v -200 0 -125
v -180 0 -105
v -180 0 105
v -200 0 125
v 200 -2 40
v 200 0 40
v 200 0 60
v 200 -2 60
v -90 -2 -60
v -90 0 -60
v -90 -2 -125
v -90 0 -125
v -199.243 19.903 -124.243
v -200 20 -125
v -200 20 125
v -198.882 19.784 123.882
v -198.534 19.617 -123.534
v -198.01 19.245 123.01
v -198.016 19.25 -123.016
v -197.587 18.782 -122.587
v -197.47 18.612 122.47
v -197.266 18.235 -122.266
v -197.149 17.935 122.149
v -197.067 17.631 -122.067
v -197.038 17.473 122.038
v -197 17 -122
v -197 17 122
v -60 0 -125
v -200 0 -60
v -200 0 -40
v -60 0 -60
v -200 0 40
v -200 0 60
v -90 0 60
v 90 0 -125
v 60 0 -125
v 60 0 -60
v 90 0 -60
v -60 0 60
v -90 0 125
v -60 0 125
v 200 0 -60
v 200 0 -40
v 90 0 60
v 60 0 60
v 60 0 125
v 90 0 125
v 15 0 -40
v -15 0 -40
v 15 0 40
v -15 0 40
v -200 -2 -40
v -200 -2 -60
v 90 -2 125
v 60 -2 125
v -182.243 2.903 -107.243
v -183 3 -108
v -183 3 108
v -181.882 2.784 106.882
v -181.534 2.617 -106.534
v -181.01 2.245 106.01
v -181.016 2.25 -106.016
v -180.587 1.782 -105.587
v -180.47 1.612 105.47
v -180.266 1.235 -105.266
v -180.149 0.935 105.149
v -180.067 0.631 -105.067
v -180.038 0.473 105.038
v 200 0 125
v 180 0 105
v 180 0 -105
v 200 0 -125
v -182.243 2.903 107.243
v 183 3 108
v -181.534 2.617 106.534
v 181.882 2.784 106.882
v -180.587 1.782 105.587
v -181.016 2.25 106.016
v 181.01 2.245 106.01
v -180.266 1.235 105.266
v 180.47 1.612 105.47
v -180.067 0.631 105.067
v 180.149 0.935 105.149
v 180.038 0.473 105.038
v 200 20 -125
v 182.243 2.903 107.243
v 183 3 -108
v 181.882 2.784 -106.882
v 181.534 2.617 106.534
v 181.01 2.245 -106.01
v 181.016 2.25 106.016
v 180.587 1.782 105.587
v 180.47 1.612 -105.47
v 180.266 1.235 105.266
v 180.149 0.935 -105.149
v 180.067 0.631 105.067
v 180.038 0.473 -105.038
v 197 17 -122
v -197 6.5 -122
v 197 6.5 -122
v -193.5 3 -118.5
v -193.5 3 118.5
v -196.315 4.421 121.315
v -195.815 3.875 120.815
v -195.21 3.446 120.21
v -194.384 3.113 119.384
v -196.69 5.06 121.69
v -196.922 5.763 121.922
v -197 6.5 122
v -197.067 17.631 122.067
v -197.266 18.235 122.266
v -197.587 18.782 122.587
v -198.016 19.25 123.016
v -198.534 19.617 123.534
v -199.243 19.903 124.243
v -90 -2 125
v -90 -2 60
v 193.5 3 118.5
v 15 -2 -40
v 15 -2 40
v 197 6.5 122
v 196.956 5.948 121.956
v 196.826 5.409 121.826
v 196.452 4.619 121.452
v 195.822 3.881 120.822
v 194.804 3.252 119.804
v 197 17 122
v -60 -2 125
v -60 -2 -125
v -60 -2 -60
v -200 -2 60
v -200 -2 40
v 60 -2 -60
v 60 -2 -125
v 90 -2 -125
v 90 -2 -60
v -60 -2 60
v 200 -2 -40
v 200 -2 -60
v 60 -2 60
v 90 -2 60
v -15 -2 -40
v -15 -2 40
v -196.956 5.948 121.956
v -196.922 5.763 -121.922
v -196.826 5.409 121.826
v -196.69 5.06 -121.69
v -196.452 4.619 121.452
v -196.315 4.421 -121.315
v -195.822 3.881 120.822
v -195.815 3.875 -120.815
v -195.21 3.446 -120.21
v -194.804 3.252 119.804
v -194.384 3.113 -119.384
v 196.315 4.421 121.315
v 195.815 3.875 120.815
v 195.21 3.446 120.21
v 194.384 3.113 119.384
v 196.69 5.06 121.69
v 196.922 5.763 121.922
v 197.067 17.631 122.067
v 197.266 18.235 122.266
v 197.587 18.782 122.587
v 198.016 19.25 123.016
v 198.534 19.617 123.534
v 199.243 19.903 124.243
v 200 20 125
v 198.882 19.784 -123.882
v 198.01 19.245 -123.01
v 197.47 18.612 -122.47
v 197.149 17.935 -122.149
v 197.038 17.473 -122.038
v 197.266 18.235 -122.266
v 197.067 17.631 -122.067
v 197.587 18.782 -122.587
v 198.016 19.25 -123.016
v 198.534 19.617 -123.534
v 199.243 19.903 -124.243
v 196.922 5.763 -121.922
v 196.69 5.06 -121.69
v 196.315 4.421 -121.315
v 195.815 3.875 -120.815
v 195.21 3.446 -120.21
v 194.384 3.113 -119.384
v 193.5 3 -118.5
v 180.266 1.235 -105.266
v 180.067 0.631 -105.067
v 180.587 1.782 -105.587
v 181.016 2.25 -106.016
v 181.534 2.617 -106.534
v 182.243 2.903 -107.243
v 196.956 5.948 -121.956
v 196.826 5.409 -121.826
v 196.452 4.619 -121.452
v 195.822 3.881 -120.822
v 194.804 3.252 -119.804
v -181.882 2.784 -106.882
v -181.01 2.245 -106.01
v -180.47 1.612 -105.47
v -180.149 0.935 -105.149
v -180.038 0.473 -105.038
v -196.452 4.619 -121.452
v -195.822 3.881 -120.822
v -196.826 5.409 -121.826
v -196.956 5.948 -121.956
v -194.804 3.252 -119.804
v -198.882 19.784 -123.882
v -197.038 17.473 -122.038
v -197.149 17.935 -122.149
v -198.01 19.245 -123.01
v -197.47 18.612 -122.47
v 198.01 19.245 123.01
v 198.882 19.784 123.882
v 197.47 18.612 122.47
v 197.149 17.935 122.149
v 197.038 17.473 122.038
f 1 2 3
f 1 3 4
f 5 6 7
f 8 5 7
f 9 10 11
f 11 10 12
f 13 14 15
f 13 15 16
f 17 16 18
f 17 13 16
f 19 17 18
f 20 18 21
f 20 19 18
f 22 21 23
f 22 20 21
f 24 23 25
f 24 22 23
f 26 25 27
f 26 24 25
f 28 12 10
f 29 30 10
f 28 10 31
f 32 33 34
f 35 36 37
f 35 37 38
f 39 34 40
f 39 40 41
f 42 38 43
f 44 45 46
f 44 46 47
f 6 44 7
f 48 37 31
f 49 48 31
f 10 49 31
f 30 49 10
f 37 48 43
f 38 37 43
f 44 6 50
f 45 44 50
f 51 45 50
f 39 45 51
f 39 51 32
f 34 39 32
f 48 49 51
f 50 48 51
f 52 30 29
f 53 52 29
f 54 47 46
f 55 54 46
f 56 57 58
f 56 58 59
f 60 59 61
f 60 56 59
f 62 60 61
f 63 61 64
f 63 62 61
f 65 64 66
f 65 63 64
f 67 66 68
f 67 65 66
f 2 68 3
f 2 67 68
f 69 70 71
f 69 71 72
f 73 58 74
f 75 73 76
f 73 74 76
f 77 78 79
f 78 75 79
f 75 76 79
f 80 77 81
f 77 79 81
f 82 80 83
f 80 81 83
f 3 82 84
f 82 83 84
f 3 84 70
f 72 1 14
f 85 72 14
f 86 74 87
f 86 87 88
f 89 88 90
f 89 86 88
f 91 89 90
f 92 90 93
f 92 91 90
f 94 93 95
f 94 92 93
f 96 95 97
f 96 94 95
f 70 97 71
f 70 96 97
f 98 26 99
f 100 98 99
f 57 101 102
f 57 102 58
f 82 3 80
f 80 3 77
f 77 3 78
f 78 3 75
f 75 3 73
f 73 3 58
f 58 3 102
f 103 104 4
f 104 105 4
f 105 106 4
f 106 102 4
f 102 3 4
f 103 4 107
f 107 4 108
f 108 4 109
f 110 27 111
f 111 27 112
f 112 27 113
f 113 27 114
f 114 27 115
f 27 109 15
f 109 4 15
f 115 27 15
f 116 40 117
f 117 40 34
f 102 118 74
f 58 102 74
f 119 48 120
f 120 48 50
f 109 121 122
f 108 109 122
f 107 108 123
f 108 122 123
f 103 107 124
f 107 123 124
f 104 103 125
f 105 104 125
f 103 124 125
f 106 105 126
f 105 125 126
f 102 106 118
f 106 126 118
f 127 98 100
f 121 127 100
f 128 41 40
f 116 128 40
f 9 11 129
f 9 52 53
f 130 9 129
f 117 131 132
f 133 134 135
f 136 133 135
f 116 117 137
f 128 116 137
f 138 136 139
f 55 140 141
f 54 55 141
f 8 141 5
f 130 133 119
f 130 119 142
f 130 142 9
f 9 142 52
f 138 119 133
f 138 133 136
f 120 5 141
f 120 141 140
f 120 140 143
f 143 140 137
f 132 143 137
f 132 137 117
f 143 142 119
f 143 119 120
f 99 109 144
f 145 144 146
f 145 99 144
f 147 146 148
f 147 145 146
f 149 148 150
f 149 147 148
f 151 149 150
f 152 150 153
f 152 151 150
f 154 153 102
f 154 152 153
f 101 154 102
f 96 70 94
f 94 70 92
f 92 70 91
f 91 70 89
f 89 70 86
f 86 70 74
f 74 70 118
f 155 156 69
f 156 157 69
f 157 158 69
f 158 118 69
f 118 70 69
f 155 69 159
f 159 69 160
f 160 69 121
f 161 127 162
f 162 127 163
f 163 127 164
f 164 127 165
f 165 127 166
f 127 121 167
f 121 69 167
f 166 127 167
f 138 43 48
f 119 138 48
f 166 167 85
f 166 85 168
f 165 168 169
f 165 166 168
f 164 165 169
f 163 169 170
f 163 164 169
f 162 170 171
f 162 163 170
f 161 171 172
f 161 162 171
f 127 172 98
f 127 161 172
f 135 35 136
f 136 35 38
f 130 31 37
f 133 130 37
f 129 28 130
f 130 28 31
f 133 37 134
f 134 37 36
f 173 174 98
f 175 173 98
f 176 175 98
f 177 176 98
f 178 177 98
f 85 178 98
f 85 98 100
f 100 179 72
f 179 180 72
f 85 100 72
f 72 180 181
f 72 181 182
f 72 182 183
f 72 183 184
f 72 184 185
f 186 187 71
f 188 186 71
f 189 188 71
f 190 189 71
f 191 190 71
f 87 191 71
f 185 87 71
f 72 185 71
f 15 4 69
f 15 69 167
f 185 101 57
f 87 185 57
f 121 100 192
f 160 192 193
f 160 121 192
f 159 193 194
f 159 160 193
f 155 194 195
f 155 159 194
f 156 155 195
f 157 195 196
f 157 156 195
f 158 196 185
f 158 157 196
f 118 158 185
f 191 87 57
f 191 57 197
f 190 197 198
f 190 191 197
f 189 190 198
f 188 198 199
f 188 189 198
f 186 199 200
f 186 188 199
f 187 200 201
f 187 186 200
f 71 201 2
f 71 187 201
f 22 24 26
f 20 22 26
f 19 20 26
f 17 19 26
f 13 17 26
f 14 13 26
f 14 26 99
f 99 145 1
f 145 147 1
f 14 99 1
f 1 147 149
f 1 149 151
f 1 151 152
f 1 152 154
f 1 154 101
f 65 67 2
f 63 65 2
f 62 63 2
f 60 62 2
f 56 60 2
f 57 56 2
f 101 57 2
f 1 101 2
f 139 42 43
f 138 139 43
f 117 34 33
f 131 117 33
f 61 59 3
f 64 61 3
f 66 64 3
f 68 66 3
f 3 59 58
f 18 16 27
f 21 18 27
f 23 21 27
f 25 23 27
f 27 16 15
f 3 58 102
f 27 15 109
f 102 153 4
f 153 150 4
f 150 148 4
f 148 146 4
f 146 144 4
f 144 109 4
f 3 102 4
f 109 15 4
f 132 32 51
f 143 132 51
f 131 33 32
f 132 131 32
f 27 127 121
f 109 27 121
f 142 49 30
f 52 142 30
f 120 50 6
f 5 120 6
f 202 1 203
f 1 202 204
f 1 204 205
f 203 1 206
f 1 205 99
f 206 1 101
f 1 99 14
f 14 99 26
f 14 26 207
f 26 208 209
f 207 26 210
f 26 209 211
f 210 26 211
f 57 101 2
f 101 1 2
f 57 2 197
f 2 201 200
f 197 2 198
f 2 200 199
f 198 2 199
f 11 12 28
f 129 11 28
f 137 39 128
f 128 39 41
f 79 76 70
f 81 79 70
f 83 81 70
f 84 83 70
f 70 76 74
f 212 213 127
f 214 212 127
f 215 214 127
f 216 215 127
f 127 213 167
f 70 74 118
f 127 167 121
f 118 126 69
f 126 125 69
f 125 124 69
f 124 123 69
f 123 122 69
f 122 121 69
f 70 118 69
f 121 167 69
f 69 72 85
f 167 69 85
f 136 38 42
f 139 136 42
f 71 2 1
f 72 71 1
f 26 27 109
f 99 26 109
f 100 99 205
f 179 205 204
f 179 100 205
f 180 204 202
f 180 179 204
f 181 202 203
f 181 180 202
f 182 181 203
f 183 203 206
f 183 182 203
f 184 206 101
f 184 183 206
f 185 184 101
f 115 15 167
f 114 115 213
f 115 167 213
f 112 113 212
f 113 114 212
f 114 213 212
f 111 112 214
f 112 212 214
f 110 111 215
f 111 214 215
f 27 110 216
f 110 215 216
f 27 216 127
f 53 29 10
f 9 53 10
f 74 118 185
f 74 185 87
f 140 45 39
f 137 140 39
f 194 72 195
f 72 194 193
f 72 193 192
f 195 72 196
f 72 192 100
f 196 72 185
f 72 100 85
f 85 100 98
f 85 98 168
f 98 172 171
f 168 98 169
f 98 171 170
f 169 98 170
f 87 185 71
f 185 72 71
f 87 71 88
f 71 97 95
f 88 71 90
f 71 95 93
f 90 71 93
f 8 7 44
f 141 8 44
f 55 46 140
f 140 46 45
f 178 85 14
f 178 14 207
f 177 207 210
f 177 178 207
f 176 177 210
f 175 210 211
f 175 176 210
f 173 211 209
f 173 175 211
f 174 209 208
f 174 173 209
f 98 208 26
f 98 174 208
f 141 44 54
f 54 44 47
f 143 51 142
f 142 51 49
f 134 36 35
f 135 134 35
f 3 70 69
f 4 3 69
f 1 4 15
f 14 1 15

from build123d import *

# Parameters (mm, degrees)
HIERRO_ANGULAR_20_X_20_X_3_1_DEPTH      = 429.284271247
HIERRO_ANGULAR_20_X_20_X_3_1_DEPTH_BACK = 29.284271247
HIERRO_ANGULAR_20_X_20_X_3_1_2_DEPTH    = 308.568542495
HIERRO_ANGULAR_20_X_20_X_3_1_3_DEPTH    = 458.568542495
HIERRO_ANGULAR_20_X_20_X_3_1_4_DEPTH    = 308.568542495
SALIENTE_EXTRUIR1_DEPTH                 = 2


with BuildPart() as part:
    # Sketch1 → Hierro angular 20 X 20 X 3(1) (new, two sides)
    with BuildSketch(Plane(origin=(-200, 0, 125), x_dir=(0, 0, -1), z_dir=(1, 0, 0))) as hierro_angular_20_x_20_x_3_1_sk:
        with BuildLine():
            Line((0, 0), (0, 20))
            ThreePointArc((0, 20), (2.121320344, 19.121320344), (3, 17))
            Line((3, 17), (3, 6.5))
            ThreePointArc((3, 6.5), (4.025126266, 4.025126266), (6.5, 3))
            Line((6.5, 3), (17, 3))
            ThreePointArc((17, 3), (19.121320344, 2.121320344), (20, 0))
            Line((20, 0), (0, 0))
        make_face()
    extrude(amount=HIERRO_ANGULAR_20_X_20_X_3_1_DEPTH)
    extrude(hierro_angular_20_x_20_x_3_1_sk.sketch, amount=-HIERRO_ANGULAR_20_X_20_X_3_1_DEPTH_BACK)

    # Hierro angular 20 X 20 X 3(1) mitre 1
    split(bisect_by=Plane(origin=(-200, 0, 125), x_dir=(0, 1, 0), z_dir=(0.707106781, 0, 0.707106781)), keep=Keep.TOP)

    # Hierro angular 20 X 20 X 3(1) mitre 2
    split(bisect_by=Plane(origin=(200, 0, 125), x_dir=(0, -1, 0), z_dir=(-0.707106781, 0, 0.707106781)), keep=Keep.TOP)


with BuildPart() as body_2:
    # Sketch1 on segment 2 (carried to segment 2) → Hierro angular 20 X 20 X 3_1 2 (new body)
    with BuildSketch(Plane(origin=(200, 0, 154.284271247), x_dir=(-1, 0, 0), z_dir=(0, 0, -1))):
        with BuildLine():
            Line((0, 0), (0, 20))
            ThreePointArc((0, 20), (2.121320344, 19.121320344), (3, 17))
            Line((3, 17), (3, 6.5))
            ThreePointArc((3, 6.5), (4.025126266, 4.025126266), (6.5, 3))
            Line((6.5, 3), (17, 3))
            ThreePointArc((17, 3), (19.121320344, 2.121320344), (20, 0))
            Line((20, 0), (0, 0))
        make_face()
    extrude(amount=HIERRO_ANGULAR_20_X_20_X_3_1_2_DEPTH)

    # Hierro angular 20 X 20 X 3_1 2 mitre 1
    split(bisect_by=Plane(origin=(200, 0, 125), x_dir=(0, 1, 0), z_dir=(0.707106781, 0, -0.707106781)), keep=Keep.TOP)

    # Hierro angular 20 X 20 X 3_1 2 mitre 2
    split(bisect_by=Plane(origin=(200, 0, -125), x_dir=(0, 1, 0), z_dir=(0.707106781, 0, 0.707106781)), keep=Keep.TOP)


with BuildPart() as body_3:
    # Sketch1 on segment 3 (carried to segment 3) → Hierro angular 20 X 20 X 3_1 3 (new body)
    with BuildSketch(Plane(origin=(229.284271247, 0, -125), x_dir=(0, 0, 1), z_dir=(-1, 0, 0))):
        with BuildLine():
            Line((0, 0), (0, 20))
            ThreePointArc((0, 20), (2.121320344, 19.121320344), (3, 17))
            Line((3, 17), (3, 6.5))
            ThreePointArc((3, 6.5), (4.025126266, 4.025126266), (6.5, 3))
            Line((6.5, 3), (17, 3))
            ThreePointArc((17, 3), (19.121320344, 2.121320344), (20, 0))
            Line((20, 0), (0, 0))
        make_face()
    extrude(amount=HIERRO_ANGULAR_20_X_20_X_3_1_3_DEPTH)

    # Hierro angular 20 X 20 X 3_1 3 mitre 1
    split(bisect_by=Plane(origin=(-200, 0, -125), x_dir=(0, 1, 0), z_dir=(0.707106781, 0, -0.707106781)), keep=Keep.TOP)

    # Hierro angular 20 X 20 X 3_1 3 mitre 2
    split(bisect_by=Plane(origin=(200, 0, -125), x_dir=(0, -1, 0), z_dir=(-0.707106781, 0, -0.707106781)), keep=Keep.TOP)


with BuildPart() as body_4:
    # Sketch1 on segment 4 (carried to segment 4) → Hierro angular 20 X 20 X 3_1 4 (new body)
    with BuildSketch(Plane(origin=(-200, 0, -154.284271247), x_dir=(1, 0, 0), z_dir=(0, 0, 1))):
        with BuildLine():
            Line((0, 0), (0, 20))
            ThreePointArc((0, 20), (2.121320344, 19.121320344), (3, 17))
            Line((3, 17), (3, 6.5))
            ThreePointArc((3, 6.5), (4.025126266, 4.025126266), (6.5, 3))
            Line((6.5, 3), (17, 3))
            ThreePointArc((17, 3), (19.121320344, 2.121320344), (20, 0))
            Line((20, 0), (0, 0))
        make_face()
    extrude(amount=HIERRO_ANGULAR_20_X_20_X_3_1_4_DEPTH)

    # Hierro angular 20 X 20 X 3_1 4 mitre 1
    split(bisect_by=Plane(origin=(-200, 0, 125), x_dir=(0, -1, 0), z_dir=(-0.707106781, 0, -0.707106781)), keep=Keep.TOP)

    # Hierro angular 20 X 20 X 3_1 4 mitre 2
    split(bisect_by=Plane(origin=(-200, 0, -125), x_dir=(0, -1, 0), z_dir=(-0.707106781, 0, 0.707106781)), keep=Keep.TOP)


with BuildPart() as body_5:
    # Croquis3 → Saliente-Extruir1 (new body)
    with BuildSketch(Plane.XZ):
        Polygon((-200, -60), (-90, -60), (-90, -125), (-60, -125), (-60, -60), (-15, -60), (15, -60), (60, -60), (60, -125), (90, -125), (90, -60), (200, -60), (200, -40), (15, -40), (15, 40), (200, 40), (200, 60), (90, 60), (90, 125), (60, 125), (60, 60), (15, 60), (-15, 60), (-60, 60), (-60, 125), (-90, 125), (-90, 60), (-200, 60), (-200, 40), (-15, 40), (-15, -40), (-200, -40), align=None)
    extrude(amount=SALIENTE_EXTRUIR1_DEPTH)


solid = Compound([part.part, body_2.part, body_3.part, body_4.part, body_5.part])
